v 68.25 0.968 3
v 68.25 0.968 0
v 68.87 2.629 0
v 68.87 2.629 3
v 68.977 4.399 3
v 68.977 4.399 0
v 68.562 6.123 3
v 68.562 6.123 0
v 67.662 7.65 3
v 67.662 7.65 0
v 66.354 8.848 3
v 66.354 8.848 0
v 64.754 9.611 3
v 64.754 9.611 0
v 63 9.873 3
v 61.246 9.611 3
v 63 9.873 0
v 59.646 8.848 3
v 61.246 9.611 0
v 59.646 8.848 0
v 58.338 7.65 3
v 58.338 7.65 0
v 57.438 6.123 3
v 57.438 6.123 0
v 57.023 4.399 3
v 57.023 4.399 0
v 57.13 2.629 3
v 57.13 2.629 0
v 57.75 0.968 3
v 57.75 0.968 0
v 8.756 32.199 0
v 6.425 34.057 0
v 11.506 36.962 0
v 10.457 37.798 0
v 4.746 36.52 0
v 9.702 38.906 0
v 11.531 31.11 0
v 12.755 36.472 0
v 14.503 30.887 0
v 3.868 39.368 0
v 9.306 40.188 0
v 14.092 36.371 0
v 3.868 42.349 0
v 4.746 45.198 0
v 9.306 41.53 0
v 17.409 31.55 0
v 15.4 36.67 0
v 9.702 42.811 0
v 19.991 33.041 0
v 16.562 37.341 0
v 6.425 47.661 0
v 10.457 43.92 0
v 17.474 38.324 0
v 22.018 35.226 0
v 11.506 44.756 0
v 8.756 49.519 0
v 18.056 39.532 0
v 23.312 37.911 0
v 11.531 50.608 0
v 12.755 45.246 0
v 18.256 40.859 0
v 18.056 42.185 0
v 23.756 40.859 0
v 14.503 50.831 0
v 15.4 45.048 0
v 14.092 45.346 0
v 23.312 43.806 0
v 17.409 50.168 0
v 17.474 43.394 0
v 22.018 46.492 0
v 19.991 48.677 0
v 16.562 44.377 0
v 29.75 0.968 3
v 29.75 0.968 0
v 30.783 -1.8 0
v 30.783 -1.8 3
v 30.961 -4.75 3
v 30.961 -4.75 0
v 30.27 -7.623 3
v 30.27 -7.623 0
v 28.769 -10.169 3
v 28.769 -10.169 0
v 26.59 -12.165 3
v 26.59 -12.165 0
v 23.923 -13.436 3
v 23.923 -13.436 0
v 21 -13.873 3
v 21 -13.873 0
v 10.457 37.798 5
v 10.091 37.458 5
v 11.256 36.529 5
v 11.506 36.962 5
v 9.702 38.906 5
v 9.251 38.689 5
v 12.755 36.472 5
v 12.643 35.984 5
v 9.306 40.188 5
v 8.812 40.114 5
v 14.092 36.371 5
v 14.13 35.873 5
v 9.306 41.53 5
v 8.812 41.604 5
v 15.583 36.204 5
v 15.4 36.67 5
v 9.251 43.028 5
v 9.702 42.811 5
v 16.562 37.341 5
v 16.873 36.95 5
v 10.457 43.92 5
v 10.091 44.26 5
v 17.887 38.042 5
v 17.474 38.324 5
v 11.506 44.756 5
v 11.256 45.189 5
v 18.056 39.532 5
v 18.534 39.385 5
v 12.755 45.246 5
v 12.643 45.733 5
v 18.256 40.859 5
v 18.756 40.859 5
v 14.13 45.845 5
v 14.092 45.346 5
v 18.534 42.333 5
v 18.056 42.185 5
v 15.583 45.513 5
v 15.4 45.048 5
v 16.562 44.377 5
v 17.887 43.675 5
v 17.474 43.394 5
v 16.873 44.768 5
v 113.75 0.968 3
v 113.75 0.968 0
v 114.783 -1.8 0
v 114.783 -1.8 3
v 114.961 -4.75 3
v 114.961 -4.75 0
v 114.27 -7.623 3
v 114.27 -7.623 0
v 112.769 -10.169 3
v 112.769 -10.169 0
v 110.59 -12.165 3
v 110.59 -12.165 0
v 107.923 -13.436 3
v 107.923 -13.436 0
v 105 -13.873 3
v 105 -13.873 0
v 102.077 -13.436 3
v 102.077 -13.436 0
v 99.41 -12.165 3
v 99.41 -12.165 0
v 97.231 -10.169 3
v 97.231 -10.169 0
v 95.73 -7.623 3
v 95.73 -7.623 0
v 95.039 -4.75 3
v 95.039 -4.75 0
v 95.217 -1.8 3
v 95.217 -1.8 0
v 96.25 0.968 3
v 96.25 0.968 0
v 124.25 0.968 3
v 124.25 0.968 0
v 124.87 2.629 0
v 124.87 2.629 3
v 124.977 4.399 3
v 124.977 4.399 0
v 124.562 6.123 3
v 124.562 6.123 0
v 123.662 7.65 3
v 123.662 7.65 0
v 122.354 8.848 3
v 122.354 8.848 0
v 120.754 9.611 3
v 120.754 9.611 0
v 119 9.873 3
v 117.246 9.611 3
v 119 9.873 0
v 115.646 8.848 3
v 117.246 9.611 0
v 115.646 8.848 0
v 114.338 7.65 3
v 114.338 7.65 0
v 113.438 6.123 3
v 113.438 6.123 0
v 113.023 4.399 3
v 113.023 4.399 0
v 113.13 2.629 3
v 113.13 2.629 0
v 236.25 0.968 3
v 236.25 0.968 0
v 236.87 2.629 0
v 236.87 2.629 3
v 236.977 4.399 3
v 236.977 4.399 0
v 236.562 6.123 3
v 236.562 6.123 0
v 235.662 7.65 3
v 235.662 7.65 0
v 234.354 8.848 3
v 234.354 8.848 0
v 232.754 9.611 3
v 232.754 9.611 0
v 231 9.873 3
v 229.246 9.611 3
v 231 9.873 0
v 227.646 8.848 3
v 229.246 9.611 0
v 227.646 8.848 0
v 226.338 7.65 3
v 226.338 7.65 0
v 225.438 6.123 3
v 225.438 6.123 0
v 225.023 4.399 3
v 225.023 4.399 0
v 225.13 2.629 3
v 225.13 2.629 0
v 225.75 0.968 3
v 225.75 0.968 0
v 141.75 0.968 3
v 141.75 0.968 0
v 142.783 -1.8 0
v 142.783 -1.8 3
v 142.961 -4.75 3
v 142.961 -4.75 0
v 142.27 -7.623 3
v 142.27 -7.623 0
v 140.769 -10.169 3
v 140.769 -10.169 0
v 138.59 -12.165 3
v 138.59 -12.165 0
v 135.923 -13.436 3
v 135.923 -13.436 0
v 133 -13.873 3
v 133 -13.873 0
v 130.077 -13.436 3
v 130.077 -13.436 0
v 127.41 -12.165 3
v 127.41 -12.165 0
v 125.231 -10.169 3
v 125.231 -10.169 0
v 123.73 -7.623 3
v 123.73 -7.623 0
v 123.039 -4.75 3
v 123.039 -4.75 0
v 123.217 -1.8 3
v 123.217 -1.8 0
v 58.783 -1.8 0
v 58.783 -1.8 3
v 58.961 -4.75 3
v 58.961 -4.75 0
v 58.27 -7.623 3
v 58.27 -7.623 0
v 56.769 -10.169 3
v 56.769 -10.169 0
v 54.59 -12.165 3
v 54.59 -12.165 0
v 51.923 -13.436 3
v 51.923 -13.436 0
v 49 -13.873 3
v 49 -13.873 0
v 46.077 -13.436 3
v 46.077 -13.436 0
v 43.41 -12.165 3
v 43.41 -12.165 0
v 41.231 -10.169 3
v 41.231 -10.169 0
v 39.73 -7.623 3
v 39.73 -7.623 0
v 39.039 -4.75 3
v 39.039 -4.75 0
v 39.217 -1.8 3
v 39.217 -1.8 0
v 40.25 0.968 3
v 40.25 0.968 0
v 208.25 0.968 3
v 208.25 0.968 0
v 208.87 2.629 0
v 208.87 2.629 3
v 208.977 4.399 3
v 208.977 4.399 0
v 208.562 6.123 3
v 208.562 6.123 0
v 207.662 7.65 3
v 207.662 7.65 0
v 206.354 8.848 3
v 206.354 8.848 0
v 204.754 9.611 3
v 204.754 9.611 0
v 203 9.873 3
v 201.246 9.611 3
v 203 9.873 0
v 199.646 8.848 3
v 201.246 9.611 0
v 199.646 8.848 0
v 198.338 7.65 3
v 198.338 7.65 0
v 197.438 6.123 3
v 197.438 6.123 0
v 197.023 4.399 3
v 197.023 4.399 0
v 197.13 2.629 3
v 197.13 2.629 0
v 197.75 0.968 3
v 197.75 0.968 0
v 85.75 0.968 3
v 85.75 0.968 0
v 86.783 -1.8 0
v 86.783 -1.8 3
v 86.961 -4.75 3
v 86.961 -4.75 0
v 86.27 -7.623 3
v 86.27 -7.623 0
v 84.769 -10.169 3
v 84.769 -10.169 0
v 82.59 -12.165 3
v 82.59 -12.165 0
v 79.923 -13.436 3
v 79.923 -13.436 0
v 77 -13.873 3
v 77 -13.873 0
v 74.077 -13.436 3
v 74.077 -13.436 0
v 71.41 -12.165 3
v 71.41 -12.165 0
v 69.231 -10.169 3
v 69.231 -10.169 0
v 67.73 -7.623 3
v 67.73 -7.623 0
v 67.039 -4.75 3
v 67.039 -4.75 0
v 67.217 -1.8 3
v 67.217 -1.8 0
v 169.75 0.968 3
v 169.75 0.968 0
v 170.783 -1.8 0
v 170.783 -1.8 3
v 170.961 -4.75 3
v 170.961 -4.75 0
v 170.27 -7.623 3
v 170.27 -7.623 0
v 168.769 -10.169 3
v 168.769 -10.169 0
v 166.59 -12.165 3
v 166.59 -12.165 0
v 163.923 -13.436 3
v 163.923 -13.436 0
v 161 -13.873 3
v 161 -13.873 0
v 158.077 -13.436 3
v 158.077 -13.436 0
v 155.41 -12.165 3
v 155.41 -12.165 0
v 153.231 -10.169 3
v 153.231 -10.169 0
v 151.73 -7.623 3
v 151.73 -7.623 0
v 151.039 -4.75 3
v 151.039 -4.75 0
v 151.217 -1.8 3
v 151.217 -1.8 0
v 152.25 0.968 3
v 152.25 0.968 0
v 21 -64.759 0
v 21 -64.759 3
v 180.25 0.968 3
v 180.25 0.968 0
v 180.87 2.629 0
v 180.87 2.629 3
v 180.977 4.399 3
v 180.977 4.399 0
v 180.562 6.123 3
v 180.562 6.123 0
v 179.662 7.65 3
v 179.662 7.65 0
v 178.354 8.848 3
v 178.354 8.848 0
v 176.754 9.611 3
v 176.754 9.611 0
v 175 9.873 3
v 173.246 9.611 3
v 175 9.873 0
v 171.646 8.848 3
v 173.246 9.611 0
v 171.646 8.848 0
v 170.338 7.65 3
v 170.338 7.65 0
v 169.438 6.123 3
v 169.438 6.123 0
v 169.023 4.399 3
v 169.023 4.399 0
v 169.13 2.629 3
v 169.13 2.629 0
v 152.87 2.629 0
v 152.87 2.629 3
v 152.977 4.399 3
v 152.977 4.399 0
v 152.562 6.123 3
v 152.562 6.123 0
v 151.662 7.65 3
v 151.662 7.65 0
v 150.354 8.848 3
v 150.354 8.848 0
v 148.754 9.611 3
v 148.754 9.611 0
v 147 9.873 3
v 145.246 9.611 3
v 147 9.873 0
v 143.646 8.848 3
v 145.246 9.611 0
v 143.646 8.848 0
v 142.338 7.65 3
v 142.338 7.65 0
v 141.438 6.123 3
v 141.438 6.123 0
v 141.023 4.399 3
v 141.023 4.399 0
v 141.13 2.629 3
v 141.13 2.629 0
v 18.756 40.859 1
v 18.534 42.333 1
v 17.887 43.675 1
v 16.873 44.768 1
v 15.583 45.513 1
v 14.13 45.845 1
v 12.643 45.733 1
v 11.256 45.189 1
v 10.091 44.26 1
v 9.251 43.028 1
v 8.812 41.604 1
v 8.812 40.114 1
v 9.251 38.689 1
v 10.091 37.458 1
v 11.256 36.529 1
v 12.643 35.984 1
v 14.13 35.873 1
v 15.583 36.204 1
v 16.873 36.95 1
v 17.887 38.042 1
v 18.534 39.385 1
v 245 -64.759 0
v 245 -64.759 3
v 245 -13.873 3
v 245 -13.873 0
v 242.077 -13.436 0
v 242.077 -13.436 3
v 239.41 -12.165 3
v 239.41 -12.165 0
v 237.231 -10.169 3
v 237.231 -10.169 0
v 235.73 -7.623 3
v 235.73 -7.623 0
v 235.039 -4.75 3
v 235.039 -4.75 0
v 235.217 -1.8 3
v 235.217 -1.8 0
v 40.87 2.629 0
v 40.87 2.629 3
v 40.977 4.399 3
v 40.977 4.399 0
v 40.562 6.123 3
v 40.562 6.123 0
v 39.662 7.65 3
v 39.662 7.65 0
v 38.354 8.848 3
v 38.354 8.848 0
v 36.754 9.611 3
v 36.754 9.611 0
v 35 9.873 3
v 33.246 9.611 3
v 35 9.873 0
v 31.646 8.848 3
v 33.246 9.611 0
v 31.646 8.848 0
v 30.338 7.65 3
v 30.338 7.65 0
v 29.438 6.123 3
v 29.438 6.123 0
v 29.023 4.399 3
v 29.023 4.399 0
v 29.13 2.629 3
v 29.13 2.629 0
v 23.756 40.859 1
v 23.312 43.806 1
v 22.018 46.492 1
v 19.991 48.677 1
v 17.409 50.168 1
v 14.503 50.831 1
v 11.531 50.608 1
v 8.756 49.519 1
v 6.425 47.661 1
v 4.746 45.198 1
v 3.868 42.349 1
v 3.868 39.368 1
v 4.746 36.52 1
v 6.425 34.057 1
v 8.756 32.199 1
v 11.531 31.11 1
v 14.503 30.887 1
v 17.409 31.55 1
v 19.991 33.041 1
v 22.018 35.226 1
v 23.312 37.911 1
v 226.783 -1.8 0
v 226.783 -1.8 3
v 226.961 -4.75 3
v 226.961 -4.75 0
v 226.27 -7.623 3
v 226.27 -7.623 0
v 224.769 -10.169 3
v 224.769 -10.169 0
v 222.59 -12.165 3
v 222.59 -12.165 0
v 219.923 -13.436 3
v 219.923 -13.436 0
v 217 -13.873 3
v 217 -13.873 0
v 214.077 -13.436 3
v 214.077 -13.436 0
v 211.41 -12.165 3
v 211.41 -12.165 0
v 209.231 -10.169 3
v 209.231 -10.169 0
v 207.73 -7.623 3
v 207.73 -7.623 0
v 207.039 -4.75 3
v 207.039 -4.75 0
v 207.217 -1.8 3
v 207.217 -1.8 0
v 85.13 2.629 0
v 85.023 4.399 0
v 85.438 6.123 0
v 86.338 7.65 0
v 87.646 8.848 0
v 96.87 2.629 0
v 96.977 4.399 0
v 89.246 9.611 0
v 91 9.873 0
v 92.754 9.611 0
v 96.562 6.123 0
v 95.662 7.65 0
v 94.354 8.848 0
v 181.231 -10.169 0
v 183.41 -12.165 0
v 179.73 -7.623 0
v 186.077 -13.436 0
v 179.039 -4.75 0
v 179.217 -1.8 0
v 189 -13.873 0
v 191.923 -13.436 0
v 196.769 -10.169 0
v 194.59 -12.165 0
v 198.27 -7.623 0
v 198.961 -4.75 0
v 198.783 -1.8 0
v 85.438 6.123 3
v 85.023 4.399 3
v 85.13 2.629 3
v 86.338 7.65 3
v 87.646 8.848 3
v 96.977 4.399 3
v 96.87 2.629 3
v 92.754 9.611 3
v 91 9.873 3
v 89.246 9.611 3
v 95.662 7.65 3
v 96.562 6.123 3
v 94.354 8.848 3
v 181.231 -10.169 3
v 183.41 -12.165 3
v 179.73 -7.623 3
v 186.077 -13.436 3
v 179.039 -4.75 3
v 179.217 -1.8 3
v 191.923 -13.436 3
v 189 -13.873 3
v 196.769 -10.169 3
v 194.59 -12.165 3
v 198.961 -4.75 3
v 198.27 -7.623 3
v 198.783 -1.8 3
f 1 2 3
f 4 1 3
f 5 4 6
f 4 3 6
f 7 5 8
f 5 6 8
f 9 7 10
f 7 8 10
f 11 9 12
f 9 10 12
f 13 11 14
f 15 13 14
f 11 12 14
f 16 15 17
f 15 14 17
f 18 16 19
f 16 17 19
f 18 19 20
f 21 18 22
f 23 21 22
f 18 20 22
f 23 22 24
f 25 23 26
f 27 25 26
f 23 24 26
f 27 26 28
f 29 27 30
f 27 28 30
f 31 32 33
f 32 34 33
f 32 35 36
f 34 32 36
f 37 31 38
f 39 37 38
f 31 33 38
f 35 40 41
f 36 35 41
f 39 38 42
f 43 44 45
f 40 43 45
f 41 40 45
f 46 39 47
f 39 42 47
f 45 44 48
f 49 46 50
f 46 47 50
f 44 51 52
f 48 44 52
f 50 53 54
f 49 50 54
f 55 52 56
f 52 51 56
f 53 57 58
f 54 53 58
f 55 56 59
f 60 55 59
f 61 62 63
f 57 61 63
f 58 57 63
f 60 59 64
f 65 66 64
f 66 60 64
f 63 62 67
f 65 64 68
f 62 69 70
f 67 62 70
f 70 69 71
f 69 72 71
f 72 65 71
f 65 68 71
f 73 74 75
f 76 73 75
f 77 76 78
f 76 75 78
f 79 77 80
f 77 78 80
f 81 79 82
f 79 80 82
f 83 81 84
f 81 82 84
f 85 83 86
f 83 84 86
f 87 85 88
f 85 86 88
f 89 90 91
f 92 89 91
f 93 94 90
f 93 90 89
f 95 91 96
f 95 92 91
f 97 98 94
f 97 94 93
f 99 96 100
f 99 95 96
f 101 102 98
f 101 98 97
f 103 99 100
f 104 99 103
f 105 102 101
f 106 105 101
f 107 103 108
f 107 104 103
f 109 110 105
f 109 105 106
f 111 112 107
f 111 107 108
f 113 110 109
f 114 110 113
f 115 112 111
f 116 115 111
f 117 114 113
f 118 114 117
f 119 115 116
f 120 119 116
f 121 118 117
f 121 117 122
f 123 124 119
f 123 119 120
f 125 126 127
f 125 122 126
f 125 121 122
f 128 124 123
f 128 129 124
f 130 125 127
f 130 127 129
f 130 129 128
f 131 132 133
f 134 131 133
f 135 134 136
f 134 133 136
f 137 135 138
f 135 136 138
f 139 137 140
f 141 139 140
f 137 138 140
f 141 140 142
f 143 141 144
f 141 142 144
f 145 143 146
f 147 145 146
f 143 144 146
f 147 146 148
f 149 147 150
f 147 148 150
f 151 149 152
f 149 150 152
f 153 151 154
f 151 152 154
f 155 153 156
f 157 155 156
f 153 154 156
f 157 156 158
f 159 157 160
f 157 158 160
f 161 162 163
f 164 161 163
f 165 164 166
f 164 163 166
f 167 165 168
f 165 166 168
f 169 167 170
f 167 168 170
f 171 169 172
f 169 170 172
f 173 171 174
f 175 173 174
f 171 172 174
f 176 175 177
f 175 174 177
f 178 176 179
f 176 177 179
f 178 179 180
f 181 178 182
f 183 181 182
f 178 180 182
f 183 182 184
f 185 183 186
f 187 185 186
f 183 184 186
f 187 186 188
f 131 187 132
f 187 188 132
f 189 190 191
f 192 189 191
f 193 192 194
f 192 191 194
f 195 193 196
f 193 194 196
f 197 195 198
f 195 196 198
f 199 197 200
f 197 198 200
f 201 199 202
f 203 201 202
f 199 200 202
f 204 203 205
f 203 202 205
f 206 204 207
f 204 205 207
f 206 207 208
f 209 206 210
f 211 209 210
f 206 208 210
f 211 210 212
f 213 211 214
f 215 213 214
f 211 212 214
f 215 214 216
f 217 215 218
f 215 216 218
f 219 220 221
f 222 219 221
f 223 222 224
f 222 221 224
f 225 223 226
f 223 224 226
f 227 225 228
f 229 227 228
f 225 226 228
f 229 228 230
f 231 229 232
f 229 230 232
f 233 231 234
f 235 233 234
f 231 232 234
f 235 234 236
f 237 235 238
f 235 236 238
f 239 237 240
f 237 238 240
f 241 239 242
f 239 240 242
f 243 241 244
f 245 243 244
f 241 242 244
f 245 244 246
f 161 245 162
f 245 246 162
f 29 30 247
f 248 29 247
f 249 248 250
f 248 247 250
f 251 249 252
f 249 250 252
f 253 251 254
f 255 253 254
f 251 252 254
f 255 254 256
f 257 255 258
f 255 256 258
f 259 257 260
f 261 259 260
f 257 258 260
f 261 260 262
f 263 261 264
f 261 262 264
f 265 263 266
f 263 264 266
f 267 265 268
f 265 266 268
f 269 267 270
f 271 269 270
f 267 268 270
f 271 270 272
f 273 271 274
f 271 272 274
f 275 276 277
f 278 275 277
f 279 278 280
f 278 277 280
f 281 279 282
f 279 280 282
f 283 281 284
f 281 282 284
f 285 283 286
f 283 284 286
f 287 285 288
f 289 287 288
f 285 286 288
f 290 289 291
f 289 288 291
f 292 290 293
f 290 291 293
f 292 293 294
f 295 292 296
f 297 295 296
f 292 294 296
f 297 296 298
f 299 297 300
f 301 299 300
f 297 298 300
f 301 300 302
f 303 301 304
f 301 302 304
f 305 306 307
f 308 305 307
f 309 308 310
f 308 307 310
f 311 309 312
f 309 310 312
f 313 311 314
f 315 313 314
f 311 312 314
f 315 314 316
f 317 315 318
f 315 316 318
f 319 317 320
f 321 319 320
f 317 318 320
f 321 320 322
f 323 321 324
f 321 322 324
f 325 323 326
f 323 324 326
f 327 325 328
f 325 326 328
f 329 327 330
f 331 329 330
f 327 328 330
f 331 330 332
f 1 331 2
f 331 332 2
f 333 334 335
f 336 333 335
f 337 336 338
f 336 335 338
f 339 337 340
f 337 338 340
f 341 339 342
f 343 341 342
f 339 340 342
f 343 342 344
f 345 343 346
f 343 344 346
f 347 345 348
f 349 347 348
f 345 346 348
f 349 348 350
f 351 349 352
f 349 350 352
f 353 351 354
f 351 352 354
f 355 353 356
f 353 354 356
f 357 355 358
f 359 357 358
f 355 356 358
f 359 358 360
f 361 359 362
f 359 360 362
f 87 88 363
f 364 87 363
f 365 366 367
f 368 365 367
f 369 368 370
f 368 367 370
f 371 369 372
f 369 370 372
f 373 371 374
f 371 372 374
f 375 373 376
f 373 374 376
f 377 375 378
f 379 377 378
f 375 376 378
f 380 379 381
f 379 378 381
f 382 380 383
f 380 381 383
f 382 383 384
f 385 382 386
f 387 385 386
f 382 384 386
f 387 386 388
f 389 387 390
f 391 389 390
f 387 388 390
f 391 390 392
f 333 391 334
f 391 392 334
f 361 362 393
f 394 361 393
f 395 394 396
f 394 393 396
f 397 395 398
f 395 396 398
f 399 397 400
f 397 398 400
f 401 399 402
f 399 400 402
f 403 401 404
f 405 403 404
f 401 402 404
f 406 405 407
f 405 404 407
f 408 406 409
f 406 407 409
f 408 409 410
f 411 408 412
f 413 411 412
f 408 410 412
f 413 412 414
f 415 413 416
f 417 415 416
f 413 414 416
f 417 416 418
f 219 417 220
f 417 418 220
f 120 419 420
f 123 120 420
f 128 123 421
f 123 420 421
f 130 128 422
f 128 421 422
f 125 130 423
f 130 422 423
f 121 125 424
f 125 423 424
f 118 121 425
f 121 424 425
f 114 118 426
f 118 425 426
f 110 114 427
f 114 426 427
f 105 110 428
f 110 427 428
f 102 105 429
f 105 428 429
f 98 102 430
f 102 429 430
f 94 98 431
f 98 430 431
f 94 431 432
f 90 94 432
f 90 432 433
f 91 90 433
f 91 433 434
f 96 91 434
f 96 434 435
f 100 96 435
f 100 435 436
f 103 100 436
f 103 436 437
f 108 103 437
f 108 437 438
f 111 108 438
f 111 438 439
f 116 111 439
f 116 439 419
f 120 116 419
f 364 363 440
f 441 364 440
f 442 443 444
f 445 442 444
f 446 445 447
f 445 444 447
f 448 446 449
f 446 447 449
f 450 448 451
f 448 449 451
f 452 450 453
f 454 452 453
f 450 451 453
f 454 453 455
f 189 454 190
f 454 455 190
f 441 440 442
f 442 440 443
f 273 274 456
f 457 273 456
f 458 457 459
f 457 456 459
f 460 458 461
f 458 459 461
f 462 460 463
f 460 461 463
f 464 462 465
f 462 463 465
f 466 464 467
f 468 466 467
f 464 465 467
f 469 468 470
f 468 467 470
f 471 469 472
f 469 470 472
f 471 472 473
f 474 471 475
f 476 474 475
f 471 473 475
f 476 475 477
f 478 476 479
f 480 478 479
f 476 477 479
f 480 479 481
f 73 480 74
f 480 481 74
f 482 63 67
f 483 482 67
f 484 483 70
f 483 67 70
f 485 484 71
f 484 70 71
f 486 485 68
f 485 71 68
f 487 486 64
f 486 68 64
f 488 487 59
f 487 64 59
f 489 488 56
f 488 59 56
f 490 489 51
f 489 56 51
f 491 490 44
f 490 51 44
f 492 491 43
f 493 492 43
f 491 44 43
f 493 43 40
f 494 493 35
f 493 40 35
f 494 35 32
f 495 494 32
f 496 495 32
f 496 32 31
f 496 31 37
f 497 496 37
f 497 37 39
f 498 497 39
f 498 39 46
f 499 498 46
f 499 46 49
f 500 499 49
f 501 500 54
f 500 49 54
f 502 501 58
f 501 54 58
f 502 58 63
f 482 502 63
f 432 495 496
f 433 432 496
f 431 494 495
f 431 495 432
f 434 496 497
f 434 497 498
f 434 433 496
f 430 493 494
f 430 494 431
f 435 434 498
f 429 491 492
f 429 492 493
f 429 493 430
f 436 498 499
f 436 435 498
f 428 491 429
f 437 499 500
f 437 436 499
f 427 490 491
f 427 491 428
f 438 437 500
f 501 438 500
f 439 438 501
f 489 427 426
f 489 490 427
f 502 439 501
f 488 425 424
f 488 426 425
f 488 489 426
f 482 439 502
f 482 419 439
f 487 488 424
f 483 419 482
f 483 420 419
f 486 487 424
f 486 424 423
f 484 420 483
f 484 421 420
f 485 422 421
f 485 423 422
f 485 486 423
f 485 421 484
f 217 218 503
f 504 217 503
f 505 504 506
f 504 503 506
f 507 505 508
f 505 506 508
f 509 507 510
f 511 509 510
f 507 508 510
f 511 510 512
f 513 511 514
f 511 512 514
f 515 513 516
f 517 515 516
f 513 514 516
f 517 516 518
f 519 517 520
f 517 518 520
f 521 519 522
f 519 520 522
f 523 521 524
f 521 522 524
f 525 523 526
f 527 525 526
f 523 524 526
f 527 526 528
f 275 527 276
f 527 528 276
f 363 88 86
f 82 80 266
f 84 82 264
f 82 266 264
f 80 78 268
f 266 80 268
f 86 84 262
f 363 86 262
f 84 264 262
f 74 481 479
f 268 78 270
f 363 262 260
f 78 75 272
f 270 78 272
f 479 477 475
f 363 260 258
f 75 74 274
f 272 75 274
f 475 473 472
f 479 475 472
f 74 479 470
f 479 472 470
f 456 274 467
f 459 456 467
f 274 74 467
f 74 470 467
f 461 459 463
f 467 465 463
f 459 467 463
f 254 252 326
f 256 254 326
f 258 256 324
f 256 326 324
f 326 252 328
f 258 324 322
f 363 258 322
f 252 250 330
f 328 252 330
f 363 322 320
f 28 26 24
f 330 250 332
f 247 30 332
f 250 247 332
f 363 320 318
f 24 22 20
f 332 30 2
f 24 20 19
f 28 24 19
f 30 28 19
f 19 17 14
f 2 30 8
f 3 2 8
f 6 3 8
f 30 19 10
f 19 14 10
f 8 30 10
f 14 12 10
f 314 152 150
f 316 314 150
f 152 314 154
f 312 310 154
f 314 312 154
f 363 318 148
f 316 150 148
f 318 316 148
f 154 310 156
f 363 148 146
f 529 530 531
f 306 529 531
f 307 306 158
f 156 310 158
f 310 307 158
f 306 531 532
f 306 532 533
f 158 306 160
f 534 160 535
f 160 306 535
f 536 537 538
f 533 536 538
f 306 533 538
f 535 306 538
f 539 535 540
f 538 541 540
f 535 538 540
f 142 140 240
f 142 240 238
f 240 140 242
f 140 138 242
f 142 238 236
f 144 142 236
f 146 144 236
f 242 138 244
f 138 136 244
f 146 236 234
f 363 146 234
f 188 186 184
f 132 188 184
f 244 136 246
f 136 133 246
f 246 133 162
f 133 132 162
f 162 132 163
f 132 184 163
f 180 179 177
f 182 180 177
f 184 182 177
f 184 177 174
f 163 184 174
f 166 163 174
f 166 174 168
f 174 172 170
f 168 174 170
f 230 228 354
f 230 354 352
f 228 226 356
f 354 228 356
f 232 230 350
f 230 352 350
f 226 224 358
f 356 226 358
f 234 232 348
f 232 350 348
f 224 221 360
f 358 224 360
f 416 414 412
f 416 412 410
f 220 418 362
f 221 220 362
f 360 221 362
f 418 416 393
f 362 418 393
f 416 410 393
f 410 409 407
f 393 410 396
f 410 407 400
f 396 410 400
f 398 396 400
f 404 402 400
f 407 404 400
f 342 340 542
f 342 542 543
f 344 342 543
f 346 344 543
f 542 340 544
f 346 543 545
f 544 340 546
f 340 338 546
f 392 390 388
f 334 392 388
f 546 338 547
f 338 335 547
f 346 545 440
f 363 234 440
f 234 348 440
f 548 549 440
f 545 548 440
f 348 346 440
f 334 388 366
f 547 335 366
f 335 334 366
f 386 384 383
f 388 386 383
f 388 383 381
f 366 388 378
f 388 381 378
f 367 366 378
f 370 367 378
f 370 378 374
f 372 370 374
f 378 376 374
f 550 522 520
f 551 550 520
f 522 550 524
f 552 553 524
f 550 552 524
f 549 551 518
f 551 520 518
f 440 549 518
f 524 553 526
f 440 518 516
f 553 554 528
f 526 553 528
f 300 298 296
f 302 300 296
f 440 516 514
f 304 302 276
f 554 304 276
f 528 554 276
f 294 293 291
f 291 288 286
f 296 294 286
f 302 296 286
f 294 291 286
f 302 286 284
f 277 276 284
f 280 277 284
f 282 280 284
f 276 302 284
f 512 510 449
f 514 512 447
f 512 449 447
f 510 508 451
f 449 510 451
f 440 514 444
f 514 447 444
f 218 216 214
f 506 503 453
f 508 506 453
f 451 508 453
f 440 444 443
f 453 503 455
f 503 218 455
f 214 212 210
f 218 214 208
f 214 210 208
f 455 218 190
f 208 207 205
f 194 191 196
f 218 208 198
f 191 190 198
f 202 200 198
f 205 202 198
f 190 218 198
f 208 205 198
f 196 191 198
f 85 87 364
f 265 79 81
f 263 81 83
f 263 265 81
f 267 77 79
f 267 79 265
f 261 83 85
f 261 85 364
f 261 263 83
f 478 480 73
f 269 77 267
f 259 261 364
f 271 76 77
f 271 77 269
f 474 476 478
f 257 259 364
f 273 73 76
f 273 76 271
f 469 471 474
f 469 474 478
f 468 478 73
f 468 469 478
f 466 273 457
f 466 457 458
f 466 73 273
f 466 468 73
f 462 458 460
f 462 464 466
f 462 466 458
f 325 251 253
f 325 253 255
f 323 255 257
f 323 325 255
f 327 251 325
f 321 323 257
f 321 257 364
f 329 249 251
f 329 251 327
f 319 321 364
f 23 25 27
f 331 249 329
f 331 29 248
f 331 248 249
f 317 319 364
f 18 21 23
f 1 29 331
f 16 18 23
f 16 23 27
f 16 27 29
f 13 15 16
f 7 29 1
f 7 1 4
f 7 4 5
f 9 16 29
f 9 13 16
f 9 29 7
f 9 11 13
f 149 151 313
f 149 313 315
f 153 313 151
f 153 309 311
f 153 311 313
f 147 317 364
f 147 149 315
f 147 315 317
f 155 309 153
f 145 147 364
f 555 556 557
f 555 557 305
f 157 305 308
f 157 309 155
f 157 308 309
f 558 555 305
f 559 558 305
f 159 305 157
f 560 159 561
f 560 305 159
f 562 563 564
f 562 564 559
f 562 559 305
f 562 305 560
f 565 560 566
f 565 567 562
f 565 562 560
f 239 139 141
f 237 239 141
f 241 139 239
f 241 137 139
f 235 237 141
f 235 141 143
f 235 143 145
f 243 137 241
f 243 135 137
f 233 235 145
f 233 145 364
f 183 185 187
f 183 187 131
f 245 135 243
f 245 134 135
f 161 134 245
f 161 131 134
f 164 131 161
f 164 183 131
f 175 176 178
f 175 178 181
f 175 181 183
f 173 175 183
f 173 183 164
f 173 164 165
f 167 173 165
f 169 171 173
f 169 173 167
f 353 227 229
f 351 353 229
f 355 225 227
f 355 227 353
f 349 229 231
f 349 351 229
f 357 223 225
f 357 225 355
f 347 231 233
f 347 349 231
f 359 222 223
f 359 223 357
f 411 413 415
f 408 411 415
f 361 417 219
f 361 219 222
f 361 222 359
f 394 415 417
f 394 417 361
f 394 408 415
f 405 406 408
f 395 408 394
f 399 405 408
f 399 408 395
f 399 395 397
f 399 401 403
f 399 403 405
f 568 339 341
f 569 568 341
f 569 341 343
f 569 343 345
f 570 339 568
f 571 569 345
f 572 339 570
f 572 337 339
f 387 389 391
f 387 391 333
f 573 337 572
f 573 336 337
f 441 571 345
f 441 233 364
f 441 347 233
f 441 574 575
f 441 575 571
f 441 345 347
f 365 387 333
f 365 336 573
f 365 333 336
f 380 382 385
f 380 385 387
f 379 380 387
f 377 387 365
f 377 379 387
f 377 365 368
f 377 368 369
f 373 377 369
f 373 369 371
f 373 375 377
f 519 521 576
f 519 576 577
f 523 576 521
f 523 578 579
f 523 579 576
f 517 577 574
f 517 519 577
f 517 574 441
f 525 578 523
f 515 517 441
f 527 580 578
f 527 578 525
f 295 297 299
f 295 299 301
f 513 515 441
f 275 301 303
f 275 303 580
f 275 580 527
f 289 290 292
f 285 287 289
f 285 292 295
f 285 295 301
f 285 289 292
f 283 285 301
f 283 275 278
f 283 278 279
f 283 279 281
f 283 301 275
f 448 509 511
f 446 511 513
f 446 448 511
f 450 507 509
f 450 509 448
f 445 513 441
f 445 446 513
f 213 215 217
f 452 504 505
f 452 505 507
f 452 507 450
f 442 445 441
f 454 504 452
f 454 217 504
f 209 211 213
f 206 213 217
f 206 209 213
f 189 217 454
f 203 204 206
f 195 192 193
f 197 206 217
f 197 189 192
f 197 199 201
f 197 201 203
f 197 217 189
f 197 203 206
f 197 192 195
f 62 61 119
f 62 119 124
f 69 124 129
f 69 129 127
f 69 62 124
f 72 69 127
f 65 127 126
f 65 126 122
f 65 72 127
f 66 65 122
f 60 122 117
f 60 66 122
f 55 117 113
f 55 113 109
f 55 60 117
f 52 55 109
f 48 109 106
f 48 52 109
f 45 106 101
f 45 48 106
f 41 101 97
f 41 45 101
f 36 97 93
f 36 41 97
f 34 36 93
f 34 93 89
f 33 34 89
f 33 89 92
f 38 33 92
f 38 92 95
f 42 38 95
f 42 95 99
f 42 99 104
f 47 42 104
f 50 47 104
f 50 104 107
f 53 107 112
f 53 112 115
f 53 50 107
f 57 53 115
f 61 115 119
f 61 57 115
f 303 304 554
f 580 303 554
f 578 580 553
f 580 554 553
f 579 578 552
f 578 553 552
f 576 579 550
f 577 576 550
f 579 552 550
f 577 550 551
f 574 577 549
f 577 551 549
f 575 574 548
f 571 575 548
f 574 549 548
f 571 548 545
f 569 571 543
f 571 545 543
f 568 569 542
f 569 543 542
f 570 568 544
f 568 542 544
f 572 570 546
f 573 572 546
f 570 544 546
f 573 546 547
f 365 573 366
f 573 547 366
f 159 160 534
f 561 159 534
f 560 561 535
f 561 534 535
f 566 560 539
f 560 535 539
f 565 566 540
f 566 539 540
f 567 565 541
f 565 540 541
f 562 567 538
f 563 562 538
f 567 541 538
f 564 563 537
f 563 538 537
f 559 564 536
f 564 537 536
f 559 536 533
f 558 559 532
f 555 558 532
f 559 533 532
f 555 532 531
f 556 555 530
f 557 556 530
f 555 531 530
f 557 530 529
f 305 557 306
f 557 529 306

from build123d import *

# Parameters (mm, degrees)
F1_DEPTH = 3
F2_R     = 10
F2_R_2   = 5
F3_DEPTH = 1
F2_R_3   = 4.5
F4_DEPTH = 5


with BuildPart() as f1:
    # F0 (on Top) → F1 (new body)
    with BuildSketch(Plane.XY):
        with BuildLine():
            ThreePointArc((29.75, 0.968246), (29.614299, -8.951748), (21, -13.872983))
            Line((21, -13.872983), (21, -64.758845))
            Line((21, -64.758845), (245, -64.758845))
            Line((245, -64.758845), (245, -13.872983))
            ThreePointArc((245, -13.872983), (236.385701, -8.951748), (236.25, 0.968246))
            ThreePointArc((236.25, 0.968246), (231, 9.872983), (225.75, 0.968246))
            ThreePointArc((225.75, 0.968246), (217, -13.872983), (208.25, 0.968246))
            ThreePointArc((208.25, 0.968246), (203, 9.872983), (197.75, 0.968246))
            ThreePointArc((197.75, 0.968246), (189, -13.872983), (180.25, 0.968246))
            ThreePointArc((180.25, 0.968246), (175, 9.872983), (169.75, 0.968246))
            ThreePointArc((169.75, 0.968246), (161, -13.872983), (152.25, 0.968246))
            ThreePointArc((152.25, 0.968246), (147, 9.872983), (141.75, 0.968246))
            ThreePointArc((141.75, 0.968246), (133, -13.872983), (124.25, 0.968246))
            ThreePointArc((124.25, 0.968246), (119, 9.872983), (113.75, 0.968246))
            ThreePointArc((113.75, 0.968246), (105, -13.872983), (96.25, 0.968246))
            ThreePointArc((96.25, 0.968246), (91, 9.872983), (85.75, 0.968246))
            ThreePointArc((85.75, 0.968246), (77, -13.872983), (68.25, 0.968246))
            ThreePointArc((68.25, 0.968246), (63, 9.872983), (57.75, 0.968246))
            ThreePointArc((57.75, 0.968246), (49, -13.872983), (40.25, 0.968246))
            ThreePointArc((40.25, 0.968246), (35, 9.872983), (29.75, 0.968246))
        make_face()
    extrude(amount=F1_DEPTH)


with BuildPart() as f3:
    # F2 (on Top) → F3 (new body)
    with BuildSketch(Plane.XY):
        with Locations((13.755906, 40.858835)):
            Circle(F2_R)
        with Locations((13.755906, 40.858835)):
            Circle(F2_R_2, mode=Mode.SUBTRACT)
    extrude(amount=F3_DEPTH)

    # F2 (on Top) → F4 (join)
    with BuildSketch(Plane.XY):
        with Locations((13.755906, 40.858835)):
            Circle(F2_R_2)
        with Locations((13.755906, 40.858835)):
            Circle(F2_R_3, mode=Mode.SUBTRACT)
    extrude(amount=F4_DEPTH)


solid = Compound([f1.part, f3.part])
